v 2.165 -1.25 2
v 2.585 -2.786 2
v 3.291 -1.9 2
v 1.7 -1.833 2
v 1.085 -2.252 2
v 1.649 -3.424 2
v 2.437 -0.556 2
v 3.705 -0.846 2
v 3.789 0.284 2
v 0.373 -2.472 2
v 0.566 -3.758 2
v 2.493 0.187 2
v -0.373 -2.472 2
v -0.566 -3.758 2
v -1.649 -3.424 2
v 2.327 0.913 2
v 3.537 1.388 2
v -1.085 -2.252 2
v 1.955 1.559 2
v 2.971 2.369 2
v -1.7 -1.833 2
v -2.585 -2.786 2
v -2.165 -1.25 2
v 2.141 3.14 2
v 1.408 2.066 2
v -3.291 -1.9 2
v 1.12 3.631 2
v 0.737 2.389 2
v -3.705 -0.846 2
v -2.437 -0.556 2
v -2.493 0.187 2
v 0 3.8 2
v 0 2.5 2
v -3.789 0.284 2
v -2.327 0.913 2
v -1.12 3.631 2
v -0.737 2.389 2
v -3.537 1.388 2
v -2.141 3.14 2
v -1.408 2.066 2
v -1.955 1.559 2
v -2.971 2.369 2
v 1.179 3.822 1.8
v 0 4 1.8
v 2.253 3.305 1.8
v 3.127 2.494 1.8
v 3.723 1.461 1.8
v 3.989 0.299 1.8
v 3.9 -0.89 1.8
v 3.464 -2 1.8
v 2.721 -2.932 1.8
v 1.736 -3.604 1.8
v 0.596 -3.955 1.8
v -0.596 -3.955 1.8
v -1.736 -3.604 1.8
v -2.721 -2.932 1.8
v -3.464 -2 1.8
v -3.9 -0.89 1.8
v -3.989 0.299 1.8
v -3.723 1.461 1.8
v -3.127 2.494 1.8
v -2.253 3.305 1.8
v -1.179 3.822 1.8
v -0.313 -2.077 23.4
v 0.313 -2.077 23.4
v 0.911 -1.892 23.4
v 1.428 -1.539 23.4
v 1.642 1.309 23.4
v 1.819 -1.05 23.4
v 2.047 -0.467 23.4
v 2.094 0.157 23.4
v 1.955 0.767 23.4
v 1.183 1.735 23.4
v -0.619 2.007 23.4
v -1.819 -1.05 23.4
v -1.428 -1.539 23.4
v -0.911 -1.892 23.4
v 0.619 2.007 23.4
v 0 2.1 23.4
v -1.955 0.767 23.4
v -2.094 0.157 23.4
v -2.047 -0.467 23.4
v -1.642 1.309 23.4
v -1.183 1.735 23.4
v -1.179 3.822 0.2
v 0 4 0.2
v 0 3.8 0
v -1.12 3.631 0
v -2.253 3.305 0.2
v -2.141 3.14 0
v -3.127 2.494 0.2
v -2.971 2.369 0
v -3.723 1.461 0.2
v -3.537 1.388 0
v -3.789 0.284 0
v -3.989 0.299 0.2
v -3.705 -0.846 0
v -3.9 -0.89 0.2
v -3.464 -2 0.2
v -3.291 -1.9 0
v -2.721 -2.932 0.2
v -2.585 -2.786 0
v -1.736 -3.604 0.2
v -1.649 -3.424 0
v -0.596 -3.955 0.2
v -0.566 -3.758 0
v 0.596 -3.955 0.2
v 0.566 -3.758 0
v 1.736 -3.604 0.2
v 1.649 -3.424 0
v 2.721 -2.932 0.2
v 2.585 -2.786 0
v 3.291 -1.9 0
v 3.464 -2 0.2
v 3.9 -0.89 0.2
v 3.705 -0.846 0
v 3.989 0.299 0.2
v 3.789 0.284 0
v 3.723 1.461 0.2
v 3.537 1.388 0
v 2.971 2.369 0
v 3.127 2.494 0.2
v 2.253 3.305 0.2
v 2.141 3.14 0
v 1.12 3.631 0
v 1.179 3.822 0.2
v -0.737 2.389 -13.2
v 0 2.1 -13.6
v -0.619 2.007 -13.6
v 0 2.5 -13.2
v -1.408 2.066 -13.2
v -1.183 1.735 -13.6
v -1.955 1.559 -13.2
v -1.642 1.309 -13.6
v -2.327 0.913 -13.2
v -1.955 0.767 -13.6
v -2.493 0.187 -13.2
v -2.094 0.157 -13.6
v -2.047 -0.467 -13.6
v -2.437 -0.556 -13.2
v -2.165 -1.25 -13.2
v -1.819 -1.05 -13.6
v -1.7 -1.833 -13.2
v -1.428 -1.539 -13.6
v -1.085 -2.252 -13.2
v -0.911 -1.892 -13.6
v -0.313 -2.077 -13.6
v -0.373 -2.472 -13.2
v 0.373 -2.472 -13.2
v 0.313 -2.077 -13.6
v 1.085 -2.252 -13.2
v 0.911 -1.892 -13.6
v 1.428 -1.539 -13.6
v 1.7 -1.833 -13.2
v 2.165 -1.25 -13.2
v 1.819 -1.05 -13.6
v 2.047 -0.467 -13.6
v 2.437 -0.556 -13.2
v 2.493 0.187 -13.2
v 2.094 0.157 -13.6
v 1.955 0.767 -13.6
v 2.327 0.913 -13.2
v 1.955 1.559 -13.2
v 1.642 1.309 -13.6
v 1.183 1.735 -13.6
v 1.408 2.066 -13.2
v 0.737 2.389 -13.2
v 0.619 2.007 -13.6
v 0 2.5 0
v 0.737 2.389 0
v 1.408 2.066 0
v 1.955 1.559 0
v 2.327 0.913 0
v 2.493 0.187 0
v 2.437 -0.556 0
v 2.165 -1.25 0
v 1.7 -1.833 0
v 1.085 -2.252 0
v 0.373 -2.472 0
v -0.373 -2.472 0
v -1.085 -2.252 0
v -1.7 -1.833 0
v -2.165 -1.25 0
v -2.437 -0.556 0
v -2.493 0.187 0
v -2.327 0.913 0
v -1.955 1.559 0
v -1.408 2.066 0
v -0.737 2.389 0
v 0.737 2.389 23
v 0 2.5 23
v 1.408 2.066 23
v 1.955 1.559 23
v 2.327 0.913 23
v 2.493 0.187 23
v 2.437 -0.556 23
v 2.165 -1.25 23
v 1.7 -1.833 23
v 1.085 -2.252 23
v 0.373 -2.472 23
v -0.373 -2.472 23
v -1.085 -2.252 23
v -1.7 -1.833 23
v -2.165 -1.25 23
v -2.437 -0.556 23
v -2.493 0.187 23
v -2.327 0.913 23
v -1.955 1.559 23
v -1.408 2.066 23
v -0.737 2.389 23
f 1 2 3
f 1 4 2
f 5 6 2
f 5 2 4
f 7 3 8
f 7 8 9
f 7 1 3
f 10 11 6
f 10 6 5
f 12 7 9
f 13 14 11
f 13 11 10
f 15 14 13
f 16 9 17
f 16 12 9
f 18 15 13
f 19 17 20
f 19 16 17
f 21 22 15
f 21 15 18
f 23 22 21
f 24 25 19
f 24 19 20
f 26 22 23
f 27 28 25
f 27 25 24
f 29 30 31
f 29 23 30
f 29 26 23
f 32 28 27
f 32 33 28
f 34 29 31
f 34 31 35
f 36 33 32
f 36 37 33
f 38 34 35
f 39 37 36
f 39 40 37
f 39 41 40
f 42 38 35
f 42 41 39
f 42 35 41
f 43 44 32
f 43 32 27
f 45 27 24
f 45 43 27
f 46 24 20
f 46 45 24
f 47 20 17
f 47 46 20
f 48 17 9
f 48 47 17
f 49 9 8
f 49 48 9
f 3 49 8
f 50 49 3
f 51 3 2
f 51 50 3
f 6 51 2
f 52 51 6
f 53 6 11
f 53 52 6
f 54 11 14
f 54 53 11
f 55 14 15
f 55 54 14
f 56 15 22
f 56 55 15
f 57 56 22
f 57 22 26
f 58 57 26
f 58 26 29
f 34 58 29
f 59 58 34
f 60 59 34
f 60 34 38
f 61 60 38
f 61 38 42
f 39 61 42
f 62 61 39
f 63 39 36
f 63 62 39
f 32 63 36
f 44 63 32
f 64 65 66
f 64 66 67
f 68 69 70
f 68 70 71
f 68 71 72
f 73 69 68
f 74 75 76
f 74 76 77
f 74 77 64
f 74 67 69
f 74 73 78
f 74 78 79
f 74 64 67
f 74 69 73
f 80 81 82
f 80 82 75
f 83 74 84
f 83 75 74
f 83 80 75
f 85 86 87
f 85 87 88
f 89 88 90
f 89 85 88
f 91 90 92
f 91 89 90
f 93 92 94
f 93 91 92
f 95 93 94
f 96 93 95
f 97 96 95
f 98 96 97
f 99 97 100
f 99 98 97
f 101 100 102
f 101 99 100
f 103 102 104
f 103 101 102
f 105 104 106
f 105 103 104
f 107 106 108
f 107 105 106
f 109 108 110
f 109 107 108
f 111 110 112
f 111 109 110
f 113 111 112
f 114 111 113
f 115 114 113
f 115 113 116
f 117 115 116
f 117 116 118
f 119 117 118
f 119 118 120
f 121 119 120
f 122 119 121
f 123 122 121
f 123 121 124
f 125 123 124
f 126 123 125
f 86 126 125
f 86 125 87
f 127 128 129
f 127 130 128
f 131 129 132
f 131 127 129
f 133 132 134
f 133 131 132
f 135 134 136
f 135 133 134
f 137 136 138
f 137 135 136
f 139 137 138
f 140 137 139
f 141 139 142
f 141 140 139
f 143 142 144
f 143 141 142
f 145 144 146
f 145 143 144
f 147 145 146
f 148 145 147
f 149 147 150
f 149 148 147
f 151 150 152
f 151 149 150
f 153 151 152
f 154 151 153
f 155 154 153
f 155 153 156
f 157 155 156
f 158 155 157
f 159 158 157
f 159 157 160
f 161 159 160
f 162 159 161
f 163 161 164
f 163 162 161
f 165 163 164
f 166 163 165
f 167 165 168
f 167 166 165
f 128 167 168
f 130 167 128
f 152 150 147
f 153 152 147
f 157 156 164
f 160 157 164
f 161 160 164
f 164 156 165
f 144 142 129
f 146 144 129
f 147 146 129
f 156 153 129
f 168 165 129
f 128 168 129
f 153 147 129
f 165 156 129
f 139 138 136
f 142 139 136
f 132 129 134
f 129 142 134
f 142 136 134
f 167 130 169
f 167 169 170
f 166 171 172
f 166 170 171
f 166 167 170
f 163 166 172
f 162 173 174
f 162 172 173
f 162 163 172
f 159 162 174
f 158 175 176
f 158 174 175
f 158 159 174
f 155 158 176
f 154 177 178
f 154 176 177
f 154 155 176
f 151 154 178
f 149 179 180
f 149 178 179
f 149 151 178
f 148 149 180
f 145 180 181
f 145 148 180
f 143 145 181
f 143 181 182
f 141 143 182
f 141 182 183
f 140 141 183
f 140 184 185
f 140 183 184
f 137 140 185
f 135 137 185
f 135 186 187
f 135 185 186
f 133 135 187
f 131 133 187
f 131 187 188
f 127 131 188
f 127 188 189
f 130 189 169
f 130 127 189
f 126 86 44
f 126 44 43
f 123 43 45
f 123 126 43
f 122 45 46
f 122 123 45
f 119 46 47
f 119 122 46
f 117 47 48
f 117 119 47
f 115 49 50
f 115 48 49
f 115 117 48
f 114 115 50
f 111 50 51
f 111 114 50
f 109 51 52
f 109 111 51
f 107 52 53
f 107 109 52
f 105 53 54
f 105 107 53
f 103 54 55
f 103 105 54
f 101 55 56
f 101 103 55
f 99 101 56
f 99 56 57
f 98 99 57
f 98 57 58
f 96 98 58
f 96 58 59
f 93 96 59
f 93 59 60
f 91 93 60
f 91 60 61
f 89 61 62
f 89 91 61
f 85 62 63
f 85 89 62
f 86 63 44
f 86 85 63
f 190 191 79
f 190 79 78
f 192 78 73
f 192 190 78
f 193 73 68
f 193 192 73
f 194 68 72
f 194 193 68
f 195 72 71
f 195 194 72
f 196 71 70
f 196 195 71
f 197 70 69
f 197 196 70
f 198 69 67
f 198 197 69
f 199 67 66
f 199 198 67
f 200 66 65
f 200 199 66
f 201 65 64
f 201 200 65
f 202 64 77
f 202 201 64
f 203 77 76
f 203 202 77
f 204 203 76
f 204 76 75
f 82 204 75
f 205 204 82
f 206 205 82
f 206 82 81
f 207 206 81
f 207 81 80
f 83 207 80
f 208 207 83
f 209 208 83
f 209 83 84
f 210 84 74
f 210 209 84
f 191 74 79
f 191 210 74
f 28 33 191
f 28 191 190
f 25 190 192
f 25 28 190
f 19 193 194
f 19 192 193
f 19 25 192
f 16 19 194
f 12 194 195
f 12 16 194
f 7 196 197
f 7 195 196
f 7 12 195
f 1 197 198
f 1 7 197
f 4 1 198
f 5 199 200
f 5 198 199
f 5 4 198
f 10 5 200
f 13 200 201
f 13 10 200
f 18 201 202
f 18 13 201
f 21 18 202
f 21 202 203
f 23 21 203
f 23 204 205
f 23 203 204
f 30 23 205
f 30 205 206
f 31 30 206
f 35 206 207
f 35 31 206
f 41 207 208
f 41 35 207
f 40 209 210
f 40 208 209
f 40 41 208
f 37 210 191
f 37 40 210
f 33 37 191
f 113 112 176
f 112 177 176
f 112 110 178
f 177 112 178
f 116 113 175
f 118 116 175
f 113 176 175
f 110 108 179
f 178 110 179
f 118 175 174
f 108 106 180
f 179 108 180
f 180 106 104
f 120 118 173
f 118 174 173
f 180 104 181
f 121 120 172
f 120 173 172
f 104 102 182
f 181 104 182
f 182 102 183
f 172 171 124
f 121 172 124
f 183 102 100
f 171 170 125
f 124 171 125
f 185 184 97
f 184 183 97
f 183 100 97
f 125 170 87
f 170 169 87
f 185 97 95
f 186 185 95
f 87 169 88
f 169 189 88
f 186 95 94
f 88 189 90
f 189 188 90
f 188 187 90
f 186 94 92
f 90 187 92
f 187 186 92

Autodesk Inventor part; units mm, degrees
ref_plane "YZ Plane" through (0, 0, 0) normal (1, 0, 0) x (0, 1, 0)
ref_plane "XZ Plane" through (0, 0, 0) normal (0, 1, 0) x (-1, 0, 0)
ref_plane "XY Plane" through (0, 0, 0) normal (0, 0, 1) x (1, 0, 0)
sketch "Sketch1" plane through (0, 0, 0) normal (1, 0, 0) x (0, 1, 0)
  line L0 (0, -13.6) -> (0, 23.4)
  line L1 (0, 23.4) -> (2.5, 23.4)
  line L2 (2.5, 23.4) -> (2.5, 2)
  line L3 (2.5, 2) -> (4, 2)
  line L4 (4, 2) -> (4, 0)
  line L5 (4, 0) -> (2.5, 0)
  line L6 (2.5, 0) -> (2.5, -13.6)
  line L7 (2.5, -13.6) -> (0, -13.6)
  point P0 (0, 0)
  dimension "d0" = 5
  dimension "d1" = 37
  dimension "d2" = 13.6
  dimension "d3" = 2
  dimension "d4" = 8
revolve "Revolution1" add sketch "Sketch1" angle 360 about axis through (0, 0, -13.6) along (0, 0, 1)
chamfer "Chamfer1" distance 0.4 angle 45 2 edges at (0, -2.5, -13.6) (0, -2.5, 23.4)
chamfer "Chamfer2" distance 0.2 angle 45 2 edges at (0, -4, 2) (0, -4, 0)
properties part number "rail-shaft" material "Stainless Steel"
